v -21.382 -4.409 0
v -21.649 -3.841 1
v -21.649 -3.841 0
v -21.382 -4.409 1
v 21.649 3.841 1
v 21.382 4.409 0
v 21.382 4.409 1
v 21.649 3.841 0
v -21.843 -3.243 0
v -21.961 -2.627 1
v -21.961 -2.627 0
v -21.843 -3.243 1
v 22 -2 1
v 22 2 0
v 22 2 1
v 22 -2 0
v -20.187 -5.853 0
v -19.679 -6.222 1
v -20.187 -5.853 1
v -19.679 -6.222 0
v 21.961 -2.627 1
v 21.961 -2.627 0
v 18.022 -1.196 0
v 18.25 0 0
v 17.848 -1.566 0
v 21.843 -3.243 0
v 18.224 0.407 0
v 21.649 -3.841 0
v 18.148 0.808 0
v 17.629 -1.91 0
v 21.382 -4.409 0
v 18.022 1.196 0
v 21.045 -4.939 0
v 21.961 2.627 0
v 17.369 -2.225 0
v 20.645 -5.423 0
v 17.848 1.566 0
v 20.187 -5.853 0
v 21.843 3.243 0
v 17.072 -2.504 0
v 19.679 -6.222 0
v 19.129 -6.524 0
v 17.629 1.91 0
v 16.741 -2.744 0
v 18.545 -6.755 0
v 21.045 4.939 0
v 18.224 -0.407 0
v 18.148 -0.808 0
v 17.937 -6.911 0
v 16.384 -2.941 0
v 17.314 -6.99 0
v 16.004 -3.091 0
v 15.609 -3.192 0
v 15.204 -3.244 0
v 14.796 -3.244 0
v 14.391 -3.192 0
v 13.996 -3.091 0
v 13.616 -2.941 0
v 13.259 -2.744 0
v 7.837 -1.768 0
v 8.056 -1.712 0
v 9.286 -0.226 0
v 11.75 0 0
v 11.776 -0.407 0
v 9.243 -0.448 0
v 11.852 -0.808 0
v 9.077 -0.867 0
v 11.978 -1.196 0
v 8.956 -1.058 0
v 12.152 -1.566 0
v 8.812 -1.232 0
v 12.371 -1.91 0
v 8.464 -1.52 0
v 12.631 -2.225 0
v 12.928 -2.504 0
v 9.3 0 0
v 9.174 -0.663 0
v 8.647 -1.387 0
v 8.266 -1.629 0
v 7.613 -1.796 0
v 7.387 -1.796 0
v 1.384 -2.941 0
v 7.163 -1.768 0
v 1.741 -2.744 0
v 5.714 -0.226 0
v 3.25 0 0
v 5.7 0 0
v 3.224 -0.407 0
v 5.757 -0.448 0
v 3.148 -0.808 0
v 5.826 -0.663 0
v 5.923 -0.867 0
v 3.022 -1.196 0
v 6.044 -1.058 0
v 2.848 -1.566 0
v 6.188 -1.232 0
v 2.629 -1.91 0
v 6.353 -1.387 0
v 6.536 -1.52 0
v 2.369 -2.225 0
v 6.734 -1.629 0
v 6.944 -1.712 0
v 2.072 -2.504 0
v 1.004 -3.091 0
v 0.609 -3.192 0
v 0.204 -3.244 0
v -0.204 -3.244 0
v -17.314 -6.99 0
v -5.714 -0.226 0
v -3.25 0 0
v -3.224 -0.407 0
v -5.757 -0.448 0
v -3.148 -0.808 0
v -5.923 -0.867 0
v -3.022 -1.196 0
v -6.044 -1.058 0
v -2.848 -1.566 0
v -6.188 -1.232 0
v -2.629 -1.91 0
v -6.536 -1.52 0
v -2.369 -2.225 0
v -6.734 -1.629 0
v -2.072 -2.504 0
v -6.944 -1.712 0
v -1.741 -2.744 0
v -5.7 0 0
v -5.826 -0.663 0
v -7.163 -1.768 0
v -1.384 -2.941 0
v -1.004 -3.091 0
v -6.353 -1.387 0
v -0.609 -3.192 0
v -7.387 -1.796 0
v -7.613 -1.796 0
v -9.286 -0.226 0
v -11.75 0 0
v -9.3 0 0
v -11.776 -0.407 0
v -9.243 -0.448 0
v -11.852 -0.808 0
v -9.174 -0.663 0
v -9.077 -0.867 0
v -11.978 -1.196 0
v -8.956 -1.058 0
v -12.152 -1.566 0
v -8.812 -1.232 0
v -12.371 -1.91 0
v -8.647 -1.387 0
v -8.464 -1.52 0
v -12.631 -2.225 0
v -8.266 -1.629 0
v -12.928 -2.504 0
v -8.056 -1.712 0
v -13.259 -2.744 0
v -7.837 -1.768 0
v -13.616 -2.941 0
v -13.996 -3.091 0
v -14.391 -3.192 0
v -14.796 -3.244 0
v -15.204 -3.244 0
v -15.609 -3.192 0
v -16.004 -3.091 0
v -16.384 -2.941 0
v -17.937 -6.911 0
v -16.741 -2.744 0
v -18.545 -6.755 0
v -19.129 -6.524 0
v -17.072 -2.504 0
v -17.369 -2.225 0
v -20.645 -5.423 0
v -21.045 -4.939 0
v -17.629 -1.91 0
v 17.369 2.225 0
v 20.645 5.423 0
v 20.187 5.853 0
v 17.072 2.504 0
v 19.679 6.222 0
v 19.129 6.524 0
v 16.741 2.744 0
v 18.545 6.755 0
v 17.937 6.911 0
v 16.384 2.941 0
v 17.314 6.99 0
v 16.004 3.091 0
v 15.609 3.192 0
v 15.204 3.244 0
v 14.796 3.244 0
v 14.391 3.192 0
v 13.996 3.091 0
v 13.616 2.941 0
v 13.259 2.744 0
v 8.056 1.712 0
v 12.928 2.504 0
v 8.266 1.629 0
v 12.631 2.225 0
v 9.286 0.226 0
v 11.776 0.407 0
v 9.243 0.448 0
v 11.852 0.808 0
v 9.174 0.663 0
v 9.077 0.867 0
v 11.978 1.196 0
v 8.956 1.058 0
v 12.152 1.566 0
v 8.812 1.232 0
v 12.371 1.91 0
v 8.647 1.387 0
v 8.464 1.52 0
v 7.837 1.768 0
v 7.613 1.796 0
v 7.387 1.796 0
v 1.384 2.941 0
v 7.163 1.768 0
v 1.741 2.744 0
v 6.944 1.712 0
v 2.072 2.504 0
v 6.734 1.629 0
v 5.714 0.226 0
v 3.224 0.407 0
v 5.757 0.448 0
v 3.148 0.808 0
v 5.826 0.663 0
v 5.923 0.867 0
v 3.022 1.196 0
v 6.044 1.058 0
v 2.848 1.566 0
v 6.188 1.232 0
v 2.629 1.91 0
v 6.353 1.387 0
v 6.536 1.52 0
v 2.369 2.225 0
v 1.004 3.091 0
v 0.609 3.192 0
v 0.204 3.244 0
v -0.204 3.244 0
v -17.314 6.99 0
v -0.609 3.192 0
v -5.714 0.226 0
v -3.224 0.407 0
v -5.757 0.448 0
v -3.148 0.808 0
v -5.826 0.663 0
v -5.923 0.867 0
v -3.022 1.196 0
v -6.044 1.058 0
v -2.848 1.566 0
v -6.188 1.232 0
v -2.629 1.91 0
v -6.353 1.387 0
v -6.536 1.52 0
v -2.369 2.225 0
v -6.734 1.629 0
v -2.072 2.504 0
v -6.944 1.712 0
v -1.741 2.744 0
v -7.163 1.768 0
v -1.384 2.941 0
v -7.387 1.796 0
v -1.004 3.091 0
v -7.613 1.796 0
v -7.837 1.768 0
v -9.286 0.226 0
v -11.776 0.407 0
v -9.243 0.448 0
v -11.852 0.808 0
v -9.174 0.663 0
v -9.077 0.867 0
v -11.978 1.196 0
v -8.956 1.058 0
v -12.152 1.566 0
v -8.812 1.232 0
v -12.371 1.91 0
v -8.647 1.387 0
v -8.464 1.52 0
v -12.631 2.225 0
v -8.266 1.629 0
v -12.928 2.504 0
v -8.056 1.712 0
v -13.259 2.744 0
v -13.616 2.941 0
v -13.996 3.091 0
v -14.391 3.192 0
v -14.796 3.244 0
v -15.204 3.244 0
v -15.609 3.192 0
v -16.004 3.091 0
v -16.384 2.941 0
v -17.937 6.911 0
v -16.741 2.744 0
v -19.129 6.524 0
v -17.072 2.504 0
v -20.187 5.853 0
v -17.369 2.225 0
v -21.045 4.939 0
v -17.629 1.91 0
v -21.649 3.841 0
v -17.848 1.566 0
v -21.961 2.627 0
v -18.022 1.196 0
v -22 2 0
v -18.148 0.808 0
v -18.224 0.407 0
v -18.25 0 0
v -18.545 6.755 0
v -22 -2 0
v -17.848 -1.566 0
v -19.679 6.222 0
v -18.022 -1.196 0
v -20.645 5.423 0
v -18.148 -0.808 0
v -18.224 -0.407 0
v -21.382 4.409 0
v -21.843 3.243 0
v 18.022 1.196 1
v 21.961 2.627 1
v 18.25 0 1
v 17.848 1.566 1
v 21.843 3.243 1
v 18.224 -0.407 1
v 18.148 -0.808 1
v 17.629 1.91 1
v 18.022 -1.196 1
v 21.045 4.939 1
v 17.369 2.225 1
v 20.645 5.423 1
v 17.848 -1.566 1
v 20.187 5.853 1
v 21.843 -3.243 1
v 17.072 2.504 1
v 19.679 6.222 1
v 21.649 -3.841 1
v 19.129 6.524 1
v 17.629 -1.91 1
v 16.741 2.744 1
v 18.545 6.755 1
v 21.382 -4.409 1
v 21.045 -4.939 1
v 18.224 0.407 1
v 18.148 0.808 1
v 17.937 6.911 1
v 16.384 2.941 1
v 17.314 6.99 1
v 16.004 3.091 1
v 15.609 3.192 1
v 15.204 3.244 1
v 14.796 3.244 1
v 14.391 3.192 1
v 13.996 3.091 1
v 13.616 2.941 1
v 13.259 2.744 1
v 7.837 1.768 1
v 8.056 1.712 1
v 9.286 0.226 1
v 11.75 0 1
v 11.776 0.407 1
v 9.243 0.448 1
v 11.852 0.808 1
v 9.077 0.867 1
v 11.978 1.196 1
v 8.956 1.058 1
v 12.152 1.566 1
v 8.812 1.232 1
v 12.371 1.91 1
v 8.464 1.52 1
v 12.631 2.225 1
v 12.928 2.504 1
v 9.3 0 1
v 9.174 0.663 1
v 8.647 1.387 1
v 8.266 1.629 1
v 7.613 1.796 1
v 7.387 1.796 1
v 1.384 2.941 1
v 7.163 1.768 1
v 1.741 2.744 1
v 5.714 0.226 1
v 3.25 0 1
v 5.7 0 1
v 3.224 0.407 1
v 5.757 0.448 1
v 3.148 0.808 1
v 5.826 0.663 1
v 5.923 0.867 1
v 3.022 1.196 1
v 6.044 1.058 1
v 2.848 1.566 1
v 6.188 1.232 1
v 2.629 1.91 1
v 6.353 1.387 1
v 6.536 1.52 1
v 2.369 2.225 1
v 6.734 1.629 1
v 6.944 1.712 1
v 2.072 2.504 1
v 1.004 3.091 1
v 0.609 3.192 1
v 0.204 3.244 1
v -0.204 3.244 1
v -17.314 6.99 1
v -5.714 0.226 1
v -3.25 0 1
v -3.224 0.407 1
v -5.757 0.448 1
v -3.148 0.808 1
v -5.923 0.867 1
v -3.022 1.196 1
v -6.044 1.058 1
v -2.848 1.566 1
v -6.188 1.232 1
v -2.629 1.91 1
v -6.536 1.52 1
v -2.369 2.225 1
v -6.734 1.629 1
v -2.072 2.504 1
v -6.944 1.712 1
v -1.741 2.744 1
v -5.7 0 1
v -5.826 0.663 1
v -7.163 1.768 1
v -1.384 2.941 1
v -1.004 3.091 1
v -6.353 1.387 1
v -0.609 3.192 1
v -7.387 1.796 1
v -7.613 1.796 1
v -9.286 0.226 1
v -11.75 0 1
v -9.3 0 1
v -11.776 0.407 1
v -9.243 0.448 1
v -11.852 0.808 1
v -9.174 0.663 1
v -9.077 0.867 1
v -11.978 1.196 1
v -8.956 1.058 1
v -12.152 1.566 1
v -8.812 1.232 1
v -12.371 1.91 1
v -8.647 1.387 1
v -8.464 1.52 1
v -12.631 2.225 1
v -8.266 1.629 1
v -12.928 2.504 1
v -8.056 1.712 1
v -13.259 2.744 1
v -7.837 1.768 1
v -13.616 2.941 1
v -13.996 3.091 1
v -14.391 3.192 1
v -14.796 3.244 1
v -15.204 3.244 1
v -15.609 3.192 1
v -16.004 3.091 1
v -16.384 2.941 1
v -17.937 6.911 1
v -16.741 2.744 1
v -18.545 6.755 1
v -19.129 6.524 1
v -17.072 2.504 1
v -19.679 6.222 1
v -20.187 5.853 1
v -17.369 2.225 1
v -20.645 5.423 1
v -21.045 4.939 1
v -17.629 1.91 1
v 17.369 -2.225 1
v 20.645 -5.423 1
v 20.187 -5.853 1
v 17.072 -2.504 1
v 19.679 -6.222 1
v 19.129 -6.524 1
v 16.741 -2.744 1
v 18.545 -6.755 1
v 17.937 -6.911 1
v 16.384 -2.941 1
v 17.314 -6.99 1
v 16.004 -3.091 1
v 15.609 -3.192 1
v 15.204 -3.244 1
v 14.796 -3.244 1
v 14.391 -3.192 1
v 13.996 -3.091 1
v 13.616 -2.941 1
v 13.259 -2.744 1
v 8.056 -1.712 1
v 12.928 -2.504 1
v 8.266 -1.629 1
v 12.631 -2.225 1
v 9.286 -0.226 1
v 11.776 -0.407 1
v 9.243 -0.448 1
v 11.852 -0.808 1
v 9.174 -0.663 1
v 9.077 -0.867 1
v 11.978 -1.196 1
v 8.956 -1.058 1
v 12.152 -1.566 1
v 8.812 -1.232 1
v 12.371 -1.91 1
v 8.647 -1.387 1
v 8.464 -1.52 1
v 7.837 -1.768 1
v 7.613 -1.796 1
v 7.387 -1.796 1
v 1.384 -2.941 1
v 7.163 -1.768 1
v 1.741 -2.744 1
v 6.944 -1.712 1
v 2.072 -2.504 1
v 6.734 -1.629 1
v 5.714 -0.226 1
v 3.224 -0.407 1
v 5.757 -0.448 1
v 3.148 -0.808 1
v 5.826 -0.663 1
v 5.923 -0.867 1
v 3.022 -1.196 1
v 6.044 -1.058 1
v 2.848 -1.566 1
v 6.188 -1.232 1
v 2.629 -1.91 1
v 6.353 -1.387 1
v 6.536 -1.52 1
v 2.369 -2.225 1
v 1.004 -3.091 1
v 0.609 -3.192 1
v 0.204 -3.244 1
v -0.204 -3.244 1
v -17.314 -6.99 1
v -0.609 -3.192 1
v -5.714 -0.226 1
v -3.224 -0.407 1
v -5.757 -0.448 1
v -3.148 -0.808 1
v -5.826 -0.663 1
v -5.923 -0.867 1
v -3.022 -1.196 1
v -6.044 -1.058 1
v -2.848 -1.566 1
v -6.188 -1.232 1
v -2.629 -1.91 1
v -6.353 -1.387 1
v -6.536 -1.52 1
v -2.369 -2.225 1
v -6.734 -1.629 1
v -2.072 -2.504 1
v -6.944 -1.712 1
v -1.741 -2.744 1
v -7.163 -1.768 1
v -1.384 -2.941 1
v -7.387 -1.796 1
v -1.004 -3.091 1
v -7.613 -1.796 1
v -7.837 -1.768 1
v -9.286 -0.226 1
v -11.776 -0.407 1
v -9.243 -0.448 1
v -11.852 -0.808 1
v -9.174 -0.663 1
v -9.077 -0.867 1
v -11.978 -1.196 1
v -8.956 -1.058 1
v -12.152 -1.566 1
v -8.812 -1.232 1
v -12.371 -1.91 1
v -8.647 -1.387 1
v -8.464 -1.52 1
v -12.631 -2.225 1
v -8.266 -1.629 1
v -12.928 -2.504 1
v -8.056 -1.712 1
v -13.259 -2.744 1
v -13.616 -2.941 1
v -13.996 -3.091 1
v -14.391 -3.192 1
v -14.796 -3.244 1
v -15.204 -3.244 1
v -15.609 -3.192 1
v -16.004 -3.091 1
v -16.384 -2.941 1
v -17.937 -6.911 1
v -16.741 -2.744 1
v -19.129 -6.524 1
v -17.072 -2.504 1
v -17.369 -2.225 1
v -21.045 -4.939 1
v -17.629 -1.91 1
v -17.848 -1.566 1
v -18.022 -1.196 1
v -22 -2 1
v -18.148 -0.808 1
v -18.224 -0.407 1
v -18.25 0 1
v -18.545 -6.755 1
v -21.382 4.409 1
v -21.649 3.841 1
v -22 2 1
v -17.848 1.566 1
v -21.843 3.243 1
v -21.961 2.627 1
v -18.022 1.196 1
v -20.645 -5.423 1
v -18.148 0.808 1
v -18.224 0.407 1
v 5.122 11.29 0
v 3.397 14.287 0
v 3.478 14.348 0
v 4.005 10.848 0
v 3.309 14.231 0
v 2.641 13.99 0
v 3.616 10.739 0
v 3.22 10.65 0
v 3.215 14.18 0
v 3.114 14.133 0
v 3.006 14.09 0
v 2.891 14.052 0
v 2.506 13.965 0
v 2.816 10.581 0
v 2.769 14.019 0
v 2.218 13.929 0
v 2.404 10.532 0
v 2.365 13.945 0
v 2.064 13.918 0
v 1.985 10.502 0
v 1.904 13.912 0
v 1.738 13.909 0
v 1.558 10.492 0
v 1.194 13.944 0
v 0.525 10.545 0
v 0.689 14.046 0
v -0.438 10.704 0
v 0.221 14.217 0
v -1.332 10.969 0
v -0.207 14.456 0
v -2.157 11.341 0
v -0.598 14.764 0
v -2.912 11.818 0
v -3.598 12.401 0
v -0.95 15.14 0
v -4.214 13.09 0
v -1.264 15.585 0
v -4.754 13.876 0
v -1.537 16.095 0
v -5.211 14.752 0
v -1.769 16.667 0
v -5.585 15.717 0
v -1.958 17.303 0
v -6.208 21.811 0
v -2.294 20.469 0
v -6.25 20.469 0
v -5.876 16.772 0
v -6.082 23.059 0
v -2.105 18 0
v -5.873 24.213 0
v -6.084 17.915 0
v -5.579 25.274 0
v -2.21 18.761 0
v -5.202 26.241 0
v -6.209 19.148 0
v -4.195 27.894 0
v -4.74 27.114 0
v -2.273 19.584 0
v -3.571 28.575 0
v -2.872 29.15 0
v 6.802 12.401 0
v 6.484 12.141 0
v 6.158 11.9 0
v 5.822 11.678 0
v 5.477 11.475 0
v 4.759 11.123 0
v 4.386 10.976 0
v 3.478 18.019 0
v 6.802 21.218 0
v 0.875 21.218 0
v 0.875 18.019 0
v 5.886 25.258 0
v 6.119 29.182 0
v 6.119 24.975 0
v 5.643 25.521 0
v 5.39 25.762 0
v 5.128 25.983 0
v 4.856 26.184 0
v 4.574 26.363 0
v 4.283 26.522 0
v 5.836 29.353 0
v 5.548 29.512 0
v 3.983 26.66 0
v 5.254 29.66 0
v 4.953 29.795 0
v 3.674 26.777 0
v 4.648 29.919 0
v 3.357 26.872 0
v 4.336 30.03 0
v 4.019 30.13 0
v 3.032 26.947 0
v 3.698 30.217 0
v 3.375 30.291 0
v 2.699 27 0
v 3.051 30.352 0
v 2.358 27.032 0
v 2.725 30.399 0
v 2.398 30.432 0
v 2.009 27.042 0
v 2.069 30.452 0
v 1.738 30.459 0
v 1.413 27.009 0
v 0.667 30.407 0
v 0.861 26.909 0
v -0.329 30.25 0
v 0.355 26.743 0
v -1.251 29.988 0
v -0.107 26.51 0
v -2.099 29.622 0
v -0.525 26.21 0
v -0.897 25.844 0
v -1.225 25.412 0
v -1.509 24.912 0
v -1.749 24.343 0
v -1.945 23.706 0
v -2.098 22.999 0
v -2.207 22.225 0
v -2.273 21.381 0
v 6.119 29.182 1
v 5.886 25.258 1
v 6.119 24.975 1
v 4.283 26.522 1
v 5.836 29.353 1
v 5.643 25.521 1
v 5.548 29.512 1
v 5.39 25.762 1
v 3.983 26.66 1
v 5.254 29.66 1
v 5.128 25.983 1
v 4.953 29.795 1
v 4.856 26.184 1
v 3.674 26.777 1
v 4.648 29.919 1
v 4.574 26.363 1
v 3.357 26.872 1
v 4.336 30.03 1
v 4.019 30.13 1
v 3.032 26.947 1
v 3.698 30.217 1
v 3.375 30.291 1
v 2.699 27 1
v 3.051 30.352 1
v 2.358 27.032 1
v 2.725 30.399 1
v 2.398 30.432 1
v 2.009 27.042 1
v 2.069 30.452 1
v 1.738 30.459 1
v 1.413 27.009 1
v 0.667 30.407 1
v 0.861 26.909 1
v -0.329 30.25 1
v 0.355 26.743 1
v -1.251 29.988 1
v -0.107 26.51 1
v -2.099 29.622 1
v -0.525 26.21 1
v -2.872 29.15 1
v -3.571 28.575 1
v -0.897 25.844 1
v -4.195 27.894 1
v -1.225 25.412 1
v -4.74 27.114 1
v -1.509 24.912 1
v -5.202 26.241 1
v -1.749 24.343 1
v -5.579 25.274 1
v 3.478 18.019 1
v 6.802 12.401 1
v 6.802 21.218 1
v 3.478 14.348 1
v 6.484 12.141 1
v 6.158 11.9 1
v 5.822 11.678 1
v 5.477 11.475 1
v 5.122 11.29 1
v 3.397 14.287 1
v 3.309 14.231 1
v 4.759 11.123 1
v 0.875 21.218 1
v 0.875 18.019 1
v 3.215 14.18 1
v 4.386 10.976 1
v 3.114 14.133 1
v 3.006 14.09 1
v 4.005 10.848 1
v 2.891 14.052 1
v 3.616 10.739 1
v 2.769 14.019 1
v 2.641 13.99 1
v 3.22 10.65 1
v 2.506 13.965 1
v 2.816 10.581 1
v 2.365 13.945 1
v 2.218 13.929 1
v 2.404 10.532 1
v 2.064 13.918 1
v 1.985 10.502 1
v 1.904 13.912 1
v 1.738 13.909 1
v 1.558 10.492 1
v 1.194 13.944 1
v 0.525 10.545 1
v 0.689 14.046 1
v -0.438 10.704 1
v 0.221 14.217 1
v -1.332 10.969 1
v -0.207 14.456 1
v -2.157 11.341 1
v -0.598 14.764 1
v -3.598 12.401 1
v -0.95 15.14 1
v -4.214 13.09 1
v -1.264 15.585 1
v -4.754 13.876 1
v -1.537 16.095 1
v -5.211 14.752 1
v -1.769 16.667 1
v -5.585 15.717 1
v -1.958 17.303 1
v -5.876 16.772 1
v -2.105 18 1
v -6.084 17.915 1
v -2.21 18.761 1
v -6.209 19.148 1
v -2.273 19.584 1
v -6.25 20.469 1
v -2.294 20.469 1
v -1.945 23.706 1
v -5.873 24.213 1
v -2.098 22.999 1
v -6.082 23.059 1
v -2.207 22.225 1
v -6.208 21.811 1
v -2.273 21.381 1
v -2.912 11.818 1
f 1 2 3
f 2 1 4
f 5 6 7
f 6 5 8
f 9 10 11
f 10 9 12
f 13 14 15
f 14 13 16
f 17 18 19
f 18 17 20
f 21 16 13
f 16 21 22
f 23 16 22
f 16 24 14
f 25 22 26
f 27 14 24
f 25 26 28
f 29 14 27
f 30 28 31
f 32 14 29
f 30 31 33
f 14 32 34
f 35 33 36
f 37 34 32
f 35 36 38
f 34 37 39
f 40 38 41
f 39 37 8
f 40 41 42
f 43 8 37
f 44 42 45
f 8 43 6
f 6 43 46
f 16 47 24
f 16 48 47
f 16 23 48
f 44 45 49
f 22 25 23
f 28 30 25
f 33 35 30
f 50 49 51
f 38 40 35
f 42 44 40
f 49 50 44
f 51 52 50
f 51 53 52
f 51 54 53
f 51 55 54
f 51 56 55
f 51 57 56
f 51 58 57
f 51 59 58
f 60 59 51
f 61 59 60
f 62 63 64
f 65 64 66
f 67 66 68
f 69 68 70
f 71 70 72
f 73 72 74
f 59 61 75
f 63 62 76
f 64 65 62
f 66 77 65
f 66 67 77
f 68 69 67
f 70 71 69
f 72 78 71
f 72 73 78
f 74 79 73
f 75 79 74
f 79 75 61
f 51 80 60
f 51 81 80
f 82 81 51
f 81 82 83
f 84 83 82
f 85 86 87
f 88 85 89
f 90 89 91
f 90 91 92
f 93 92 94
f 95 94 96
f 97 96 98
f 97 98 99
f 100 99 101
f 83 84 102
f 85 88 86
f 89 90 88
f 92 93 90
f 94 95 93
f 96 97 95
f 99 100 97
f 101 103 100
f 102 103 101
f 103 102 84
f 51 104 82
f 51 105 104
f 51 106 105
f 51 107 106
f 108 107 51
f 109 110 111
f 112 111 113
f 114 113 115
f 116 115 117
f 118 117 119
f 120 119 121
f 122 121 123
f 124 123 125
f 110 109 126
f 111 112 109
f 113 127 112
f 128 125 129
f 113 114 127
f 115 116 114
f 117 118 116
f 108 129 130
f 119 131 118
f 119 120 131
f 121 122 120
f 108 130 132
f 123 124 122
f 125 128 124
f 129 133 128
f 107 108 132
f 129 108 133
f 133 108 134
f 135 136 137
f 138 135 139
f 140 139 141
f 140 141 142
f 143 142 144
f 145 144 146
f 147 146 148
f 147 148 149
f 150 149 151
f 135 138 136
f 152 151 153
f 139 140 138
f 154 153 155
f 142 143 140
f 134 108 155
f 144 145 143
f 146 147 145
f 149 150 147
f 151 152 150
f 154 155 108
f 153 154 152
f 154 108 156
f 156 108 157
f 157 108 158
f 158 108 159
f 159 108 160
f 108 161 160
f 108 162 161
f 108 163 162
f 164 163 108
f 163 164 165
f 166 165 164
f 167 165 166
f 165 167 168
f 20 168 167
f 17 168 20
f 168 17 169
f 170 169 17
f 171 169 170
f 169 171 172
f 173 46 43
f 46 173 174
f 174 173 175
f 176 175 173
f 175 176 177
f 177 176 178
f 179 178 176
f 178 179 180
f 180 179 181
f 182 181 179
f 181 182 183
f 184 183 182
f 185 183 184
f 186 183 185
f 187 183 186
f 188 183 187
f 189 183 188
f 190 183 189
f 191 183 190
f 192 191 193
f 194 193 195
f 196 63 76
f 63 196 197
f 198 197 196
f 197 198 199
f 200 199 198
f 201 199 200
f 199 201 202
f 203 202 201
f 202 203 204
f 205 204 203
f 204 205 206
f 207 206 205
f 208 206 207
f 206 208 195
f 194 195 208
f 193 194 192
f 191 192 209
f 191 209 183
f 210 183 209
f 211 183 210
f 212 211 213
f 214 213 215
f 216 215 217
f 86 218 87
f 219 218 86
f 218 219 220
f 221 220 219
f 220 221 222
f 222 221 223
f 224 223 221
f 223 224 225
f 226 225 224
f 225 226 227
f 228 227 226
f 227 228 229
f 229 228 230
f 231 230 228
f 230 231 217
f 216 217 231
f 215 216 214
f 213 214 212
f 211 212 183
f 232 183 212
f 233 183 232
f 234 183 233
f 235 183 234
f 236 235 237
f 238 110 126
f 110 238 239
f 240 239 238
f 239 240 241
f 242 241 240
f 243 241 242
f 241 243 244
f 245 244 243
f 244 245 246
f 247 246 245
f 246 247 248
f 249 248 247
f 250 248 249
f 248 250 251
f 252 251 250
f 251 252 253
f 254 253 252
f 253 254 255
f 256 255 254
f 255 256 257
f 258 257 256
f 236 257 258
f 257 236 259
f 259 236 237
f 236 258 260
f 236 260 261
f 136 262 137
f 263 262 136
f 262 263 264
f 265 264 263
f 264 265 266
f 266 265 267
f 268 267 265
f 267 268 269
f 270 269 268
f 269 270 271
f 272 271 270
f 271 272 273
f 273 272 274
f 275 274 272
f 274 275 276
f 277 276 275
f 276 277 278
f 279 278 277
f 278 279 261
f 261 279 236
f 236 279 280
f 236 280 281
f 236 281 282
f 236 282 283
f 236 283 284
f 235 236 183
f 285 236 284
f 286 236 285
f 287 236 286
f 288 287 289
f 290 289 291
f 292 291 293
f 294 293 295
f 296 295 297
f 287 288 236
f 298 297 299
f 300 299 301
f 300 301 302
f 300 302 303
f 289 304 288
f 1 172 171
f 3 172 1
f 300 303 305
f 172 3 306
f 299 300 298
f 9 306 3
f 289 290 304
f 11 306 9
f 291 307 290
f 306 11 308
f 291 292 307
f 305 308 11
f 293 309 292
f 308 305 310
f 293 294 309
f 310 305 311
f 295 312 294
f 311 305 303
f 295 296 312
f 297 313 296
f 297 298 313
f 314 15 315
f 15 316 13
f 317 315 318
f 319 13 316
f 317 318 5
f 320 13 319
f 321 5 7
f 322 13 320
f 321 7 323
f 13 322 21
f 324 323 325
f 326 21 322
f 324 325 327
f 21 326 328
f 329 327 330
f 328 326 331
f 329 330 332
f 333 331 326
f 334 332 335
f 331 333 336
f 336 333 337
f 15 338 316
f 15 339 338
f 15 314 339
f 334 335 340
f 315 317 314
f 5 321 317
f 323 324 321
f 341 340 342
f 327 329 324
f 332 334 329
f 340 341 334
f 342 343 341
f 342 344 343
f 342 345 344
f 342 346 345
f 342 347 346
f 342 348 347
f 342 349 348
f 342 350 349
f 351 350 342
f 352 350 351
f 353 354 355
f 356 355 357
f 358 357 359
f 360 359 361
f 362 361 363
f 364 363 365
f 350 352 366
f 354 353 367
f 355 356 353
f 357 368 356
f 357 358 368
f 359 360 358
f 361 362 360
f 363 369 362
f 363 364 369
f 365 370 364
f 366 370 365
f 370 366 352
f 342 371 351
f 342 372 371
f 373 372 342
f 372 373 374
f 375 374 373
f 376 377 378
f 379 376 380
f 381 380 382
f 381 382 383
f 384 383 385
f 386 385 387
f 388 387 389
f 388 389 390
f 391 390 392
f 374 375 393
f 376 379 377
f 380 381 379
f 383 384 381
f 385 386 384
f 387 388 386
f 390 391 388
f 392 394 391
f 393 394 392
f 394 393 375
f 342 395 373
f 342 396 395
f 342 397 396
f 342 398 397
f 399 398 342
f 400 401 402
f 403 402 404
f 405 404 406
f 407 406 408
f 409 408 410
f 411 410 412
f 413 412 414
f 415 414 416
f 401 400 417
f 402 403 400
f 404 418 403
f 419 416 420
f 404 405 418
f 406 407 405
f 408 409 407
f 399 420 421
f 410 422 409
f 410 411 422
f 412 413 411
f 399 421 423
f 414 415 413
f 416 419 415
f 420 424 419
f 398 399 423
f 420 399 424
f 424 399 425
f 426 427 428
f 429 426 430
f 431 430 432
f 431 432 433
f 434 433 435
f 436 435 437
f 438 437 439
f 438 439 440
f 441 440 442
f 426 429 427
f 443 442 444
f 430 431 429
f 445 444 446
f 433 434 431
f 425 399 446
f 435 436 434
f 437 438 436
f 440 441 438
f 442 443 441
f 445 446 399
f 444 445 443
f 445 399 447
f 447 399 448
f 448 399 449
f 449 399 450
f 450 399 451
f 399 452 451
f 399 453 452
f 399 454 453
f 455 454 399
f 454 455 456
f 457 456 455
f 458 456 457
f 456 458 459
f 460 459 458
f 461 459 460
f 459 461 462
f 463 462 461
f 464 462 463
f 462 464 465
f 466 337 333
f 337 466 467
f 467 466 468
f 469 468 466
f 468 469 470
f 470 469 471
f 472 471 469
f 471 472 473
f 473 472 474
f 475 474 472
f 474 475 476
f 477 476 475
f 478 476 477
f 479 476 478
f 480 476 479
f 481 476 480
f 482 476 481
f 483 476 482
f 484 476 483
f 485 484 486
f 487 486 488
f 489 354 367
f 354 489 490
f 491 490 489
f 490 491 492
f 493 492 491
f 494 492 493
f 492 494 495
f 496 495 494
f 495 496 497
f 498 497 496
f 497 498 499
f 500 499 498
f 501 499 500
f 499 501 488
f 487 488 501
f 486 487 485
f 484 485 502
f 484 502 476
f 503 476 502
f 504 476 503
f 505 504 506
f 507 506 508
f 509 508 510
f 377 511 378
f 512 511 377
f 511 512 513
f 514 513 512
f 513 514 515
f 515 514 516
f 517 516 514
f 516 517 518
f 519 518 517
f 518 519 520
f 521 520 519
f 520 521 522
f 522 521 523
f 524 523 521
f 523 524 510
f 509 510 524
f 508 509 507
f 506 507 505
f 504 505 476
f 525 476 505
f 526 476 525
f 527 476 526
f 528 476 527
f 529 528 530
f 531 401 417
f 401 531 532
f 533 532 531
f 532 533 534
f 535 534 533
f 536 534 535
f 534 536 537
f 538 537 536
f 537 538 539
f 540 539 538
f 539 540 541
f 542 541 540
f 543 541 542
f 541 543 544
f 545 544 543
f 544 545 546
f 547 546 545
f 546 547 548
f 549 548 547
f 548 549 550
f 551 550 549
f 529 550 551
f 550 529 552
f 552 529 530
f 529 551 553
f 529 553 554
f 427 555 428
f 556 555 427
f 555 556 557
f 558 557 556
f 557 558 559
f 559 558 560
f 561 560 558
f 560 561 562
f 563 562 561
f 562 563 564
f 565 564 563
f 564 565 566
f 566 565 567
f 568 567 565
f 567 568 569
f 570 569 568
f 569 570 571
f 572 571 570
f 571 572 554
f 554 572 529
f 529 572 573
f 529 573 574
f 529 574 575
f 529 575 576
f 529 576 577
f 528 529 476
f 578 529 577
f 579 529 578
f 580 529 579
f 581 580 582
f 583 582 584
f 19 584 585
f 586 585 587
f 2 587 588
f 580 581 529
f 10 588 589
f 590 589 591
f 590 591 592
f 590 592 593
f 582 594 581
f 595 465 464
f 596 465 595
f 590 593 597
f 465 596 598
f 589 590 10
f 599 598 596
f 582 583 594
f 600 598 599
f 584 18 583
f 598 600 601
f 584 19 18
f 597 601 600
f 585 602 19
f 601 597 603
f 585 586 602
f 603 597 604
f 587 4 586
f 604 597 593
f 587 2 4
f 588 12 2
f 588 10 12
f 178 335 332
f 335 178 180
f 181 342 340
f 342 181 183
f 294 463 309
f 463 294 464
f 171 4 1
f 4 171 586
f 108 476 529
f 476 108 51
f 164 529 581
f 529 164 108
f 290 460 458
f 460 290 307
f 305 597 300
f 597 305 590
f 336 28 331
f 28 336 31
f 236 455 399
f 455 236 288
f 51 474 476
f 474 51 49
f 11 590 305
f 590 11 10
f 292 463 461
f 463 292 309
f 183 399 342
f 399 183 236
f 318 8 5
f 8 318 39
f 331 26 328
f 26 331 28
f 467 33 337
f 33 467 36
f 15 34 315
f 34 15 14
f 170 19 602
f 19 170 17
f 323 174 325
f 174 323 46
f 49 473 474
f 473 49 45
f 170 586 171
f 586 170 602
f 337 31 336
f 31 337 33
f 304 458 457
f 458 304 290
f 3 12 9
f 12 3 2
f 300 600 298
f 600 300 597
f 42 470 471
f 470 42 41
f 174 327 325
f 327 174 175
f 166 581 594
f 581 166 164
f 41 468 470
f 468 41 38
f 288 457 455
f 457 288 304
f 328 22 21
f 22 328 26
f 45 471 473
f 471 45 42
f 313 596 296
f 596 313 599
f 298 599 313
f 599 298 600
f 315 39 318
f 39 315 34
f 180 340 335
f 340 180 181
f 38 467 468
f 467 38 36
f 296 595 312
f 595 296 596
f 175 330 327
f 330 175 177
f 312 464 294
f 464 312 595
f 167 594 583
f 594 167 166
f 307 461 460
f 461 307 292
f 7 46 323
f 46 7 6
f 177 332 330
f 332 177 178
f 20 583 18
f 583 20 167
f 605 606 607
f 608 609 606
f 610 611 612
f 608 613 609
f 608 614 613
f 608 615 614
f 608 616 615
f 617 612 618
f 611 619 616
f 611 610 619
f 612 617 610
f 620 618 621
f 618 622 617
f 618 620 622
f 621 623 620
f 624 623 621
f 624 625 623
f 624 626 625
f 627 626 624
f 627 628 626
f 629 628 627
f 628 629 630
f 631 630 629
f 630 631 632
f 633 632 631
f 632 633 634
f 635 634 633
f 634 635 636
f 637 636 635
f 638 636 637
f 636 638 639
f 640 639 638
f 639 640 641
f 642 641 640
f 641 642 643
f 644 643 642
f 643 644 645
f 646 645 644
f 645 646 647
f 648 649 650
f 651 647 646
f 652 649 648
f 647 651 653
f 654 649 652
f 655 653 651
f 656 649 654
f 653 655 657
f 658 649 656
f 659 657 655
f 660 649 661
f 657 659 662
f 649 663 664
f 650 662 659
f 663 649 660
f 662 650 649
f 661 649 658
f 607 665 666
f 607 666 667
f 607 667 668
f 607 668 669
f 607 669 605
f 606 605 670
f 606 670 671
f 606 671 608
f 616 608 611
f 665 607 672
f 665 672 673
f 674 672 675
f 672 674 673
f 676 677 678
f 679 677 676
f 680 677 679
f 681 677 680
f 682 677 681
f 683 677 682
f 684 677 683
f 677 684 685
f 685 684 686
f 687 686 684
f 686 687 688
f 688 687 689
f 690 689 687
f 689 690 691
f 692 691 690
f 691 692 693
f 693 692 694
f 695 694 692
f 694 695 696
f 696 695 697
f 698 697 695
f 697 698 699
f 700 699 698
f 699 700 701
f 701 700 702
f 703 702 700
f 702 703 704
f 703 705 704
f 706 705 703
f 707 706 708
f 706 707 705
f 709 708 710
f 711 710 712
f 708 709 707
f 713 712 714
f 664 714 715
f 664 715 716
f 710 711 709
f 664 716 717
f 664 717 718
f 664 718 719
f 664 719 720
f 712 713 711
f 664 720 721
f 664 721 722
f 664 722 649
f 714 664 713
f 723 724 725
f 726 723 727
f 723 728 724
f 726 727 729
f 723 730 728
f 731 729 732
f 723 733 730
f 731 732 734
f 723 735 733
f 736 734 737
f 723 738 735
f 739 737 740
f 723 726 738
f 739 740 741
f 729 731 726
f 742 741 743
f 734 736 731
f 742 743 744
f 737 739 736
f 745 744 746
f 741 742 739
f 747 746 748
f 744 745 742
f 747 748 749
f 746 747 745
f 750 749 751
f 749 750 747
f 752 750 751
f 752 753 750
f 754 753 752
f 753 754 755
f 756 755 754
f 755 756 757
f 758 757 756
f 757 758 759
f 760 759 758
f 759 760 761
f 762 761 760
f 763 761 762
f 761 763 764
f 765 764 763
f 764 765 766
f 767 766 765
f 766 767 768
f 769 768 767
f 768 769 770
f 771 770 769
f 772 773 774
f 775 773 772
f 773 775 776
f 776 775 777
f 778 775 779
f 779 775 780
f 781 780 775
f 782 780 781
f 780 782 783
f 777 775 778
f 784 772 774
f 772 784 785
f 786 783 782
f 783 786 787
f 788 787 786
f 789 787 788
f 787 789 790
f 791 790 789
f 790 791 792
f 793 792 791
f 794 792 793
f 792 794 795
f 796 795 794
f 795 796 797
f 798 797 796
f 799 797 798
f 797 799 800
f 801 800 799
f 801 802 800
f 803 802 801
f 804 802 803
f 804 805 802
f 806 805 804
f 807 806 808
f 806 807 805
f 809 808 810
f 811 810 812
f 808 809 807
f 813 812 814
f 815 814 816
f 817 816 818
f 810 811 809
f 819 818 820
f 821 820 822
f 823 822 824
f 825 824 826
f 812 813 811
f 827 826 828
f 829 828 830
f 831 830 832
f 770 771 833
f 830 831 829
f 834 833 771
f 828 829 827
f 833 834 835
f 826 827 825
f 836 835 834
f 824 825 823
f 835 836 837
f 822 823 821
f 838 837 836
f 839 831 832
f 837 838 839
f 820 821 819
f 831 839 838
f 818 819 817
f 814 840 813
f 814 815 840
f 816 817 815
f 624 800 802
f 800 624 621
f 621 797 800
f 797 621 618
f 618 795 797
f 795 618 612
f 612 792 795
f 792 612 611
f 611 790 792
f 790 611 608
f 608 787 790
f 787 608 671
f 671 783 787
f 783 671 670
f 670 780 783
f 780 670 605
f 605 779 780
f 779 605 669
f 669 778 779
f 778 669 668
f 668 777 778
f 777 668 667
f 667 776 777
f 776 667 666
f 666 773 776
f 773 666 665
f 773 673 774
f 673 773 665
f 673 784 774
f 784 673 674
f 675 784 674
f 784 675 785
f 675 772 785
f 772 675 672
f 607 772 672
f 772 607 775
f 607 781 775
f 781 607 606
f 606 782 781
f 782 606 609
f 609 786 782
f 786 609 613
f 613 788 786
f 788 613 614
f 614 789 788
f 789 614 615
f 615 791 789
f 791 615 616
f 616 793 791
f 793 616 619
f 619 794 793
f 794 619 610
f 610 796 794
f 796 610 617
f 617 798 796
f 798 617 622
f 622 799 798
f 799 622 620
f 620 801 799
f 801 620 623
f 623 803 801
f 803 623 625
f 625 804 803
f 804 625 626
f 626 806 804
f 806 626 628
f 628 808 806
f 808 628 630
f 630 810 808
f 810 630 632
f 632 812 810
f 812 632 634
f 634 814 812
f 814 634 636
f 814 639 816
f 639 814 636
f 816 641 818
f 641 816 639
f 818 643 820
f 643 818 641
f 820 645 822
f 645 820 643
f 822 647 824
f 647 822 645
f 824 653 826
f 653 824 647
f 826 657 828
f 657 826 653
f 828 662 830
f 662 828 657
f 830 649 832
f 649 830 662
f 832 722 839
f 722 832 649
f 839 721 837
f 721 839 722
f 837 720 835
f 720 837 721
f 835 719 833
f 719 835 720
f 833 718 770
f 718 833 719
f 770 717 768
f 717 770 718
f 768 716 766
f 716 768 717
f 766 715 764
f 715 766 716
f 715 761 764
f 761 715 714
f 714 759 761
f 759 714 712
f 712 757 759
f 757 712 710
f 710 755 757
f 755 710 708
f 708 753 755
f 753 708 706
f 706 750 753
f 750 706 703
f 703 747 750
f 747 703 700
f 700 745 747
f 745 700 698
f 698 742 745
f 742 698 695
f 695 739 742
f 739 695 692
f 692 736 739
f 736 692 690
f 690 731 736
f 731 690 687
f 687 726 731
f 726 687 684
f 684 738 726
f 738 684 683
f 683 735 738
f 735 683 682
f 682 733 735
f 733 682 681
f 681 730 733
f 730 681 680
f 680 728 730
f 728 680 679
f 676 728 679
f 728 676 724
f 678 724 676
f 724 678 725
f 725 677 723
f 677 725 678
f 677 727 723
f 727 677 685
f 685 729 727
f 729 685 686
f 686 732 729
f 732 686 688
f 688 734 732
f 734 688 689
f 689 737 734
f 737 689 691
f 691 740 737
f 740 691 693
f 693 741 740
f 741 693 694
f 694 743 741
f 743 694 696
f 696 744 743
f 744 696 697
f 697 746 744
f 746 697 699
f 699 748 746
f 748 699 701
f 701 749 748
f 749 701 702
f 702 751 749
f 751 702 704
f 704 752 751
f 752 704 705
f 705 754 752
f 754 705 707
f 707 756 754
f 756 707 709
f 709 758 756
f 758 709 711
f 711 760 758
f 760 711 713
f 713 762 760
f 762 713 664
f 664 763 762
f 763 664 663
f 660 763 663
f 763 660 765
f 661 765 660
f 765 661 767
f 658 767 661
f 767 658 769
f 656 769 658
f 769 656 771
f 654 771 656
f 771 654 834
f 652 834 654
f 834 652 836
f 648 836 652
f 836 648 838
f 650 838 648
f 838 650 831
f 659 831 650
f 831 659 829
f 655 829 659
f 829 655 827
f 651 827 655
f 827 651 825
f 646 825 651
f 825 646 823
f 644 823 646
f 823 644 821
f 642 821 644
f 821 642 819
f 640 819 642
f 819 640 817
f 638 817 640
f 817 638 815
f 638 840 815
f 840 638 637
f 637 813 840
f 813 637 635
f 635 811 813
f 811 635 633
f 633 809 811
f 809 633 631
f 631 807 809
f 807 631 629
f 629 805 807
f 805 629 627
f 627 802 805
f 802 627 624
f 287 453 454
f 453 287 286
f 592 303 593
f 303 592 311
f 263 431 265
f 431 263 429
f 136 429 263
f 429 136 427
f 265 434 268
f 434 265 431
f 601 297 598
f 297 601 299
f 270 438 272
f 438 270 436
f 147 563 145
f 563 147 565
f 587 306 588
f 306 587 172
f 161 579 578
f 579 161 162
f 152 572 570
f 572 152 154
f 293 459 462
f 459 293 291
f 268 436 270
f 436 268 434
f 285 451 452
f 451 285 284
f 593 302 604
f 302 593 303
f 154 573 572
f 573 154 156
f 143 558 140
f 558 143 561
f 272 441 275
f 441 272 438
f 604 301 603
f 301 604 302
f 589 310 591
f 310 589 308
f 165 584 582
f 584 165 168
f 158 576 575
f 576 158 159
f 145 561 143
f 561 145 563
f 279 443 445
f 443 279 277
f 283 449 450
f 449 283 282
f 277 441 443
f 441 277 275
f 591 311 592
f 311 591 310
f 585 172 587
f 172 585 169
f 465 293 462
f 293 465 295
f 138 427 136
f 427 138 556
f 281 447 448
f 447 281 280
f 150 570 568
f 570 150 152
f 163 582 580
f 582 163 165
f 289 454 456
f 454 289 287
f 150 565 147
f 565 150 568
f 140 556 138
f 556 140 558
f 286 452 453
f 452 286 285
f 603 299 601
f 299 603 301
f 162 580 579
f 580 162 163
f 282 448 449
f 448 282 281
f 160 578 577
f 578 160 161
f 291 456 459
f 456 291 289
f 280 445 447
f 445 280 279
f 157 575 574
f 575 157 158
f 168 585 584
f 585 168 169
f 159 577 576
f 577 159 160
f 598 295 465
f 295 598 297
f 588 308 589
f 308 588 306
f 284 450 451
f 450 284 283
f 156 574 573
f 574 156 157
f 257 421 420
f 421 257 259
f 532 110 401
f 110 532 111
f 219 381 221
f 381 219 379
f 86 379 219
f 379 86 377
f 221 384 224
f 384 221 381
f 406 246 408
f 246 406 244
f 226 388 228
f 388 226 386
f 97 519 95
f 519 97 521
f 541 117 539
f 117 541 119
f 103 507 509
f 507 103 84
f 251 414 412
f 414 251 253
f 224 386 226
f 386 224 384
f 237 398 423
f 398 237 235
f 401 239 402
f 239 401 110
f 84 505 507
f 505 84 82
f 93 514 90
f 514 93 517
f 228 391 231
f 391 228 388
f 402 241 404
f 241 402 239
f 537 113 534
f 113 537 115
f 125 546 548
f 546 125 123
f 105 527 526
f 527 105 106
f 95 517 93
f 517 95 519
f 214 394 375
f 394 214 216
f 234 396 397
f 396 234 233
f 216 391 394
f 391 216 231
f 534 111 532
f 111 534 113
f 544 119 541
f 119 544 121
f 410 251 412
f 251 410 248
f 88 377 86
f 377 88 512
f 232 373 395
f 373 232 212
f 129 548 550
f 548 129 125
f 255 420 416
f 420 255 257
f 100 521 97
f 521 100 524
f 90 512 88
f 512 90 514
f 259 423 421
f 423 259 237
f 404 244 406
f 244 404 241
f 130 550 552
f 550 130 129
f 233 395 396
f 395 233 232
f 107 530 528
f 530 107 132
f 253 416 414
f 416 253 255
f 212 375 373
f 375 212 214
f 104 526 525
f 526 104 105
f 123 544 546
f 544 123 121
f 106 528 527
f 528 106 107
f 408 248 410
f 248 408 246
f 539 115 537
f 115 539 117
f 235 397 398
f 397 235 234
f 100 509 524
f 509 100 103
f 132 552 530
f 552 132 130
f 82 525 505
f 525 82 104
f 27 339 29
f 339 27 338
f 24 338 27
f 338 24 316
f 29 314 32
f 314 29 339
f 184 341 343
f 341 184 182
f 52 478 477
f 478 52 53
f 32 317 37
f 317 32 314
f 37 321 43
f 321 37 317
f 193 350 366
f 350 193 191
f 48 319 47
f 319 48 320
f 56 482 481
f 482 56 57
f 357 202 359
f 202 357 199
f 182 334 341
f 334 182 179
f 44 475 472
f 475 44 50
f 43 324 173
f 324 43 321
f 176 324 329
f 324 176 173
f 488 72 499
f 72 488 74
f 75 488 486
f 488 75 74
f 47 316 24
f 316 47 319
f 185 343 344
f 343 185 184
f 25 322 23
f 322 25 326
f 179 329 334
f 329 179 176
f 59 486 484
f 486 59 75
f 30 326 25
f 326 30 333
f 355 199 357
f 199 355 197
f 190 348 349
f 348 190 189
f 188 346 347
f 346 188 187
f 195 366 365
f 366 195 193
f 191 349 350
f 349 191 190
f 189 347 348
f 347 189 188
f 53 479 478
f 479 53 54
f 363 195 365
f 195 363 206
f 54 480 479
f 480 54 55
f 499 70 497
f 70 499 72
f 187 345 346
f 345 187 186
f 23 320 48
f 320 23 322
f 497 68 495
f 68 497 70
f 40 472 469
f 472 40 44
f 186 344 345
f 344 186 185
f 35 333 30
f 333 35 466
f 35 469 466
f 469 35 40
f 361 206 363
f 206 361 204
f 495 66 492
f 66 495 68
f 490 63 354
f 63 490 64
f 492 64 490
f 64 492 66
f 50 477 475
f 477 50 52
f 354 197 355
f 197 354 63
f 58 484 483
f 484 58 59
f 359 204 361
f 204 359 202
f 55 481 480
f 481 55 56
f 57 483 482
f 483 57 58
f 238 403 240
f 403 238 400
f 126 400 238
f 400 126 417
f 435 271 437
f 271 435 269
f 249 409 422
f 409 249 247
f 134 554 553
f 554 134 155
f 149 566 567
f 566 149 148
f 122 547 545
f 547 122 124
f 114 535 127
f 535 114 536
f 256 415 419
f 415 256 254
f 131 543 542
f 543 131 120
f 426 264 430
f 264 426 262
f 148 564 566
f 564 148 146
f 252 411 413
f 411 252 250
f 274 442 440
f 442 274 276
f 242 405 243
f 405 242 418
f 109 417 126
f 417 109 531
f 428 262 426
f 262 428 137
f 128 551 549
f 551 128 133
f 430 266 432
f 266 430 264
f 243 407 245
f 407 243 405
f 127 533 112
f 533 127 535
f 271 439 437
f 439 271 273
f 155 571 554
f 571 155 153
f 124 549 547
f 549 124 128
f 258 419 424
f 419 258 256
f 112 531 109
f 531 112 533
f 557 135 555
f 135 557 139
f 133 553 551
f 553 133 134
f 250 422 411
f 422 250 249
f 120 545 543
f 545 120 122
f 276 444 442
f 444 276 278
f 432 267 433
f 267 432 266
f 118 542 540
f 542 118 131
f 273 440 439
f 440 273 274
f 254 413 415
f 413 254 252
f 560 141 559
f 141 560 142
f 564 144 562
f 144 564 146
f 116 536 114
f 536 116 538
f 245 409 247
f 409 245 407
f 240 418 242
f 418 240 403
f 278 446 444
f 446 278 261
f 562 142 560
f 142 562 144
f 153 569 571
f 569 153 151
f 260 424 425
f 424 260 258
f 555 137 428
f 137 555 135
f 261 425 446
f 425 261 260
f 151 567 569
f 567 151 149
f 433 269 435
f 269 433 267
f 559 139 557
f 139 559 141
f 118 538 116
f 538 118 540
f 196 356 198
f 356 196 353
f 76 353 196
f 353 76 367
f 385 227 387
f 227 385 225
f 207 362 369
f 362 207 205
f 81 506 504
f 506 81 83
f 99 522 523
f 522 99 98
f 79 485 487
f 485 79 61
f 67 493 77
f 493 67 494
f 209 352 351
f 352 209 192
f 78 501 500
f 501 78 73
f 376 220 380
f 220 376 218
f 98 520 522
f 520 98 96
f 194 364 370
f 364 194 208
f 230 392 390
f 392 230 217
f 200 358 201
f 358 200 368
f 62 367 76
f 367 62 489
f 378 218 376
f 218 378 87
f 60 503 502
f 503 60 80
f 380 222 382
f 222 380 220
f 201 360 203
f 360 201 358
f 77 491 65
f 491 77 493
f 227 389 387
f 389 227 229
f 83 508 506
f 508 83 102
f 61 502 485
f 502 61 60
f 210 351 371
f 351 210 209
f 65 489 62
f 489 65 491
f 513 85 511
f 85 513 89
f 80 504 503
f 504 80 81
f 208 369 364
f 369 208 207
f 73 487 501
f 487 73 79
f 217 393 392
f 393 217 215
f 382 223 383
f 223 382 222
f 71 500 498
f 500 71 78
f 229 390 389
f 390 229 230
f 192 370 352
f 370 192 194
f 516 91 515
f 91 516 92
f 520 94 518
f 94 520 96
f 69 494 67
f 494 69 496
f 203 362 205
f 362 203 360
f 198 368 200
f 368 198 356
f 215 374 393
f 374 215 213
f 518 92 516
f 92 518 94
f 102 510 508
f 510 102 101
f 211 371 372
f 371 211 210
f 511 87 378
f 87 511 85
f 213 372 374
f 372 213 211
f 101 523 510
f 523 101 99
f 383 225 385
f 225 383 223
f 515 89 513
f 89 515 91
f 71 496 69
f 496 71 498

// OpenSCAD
$fn = 50;


difference() {
	union() {
		hull() {
			translate(v = [-17.0000000000, 2.0000000000, 0]) {
				cylinder(h = 1, r = 5);
			}
			translate(v = [17.0000000000, 2.0000000000, 0]) {
				cylinder(h = 1, r = 5);
			}
			translate(v = [-17.0000000000, -2.0000000000, 0]) {
				cylinder(h = 1, r = 5);
			}
			translate(v = [17.0000000000, -2.0000000000, 0]) {
				cylinder(h = 1, r = 5);
			}
		}
		translate(v = [0, 30.0000000000, 0]) {
			linear_extrude(height = 1) {
				text(font = "DejaVu Sans Mono:style=Bold", halign = "center", size = 19.0000000000, text = "G", valign = "top");
			}
		}
	}
	union() {
		translate(v = [-15.0000000000, 0.0000000000, 0]) {
			translate(v = [0, 0, -100]) {
				cylinder(h = 200, r = 3.2500000000);
			}
		}
		translate(v = [0, 0, -100]) {
			cylinder(h = 200, r = 3.2500000000);
		}
		translate(v = [15.0000000000, 0.0000000000, 0]) {
			translate(v = [0, 0, -100]) {
				cylinder(h = 200, r = 3.2500000000);
			}
		}
		translate(v = [-15.0000000000, 0.0000000000, 0]) {
			translate(v = [0, 0, -100]) {
				cylinder(h = 200, r = 1.8000000000);
			}
		}
		translate(v = [-7.5000000000, 0.0000000000, 0]) {
			translate(v = [0, 0, -100]) {
				cylinder(h = 200, r = 1.8000000000);
			}
		}
		translate(v = [0, 0, -100]) {
			cylinder(h = 200, r = 1.8000000000);
		}
		translate(v = [7.5000000000, 0.0000000000, 0]) {
			translate(v = [0, 0, -100]) {
				cylinder(h = 200, r = 1.8000000000);
			}
		}
		translate(v = [15.0000000000, 0.0000000000, 0]) {
			translate(v = [0, 0, -100]) {
				cylinder(h = 200, r = 1.8000000000);
			}
		}
	}
}
